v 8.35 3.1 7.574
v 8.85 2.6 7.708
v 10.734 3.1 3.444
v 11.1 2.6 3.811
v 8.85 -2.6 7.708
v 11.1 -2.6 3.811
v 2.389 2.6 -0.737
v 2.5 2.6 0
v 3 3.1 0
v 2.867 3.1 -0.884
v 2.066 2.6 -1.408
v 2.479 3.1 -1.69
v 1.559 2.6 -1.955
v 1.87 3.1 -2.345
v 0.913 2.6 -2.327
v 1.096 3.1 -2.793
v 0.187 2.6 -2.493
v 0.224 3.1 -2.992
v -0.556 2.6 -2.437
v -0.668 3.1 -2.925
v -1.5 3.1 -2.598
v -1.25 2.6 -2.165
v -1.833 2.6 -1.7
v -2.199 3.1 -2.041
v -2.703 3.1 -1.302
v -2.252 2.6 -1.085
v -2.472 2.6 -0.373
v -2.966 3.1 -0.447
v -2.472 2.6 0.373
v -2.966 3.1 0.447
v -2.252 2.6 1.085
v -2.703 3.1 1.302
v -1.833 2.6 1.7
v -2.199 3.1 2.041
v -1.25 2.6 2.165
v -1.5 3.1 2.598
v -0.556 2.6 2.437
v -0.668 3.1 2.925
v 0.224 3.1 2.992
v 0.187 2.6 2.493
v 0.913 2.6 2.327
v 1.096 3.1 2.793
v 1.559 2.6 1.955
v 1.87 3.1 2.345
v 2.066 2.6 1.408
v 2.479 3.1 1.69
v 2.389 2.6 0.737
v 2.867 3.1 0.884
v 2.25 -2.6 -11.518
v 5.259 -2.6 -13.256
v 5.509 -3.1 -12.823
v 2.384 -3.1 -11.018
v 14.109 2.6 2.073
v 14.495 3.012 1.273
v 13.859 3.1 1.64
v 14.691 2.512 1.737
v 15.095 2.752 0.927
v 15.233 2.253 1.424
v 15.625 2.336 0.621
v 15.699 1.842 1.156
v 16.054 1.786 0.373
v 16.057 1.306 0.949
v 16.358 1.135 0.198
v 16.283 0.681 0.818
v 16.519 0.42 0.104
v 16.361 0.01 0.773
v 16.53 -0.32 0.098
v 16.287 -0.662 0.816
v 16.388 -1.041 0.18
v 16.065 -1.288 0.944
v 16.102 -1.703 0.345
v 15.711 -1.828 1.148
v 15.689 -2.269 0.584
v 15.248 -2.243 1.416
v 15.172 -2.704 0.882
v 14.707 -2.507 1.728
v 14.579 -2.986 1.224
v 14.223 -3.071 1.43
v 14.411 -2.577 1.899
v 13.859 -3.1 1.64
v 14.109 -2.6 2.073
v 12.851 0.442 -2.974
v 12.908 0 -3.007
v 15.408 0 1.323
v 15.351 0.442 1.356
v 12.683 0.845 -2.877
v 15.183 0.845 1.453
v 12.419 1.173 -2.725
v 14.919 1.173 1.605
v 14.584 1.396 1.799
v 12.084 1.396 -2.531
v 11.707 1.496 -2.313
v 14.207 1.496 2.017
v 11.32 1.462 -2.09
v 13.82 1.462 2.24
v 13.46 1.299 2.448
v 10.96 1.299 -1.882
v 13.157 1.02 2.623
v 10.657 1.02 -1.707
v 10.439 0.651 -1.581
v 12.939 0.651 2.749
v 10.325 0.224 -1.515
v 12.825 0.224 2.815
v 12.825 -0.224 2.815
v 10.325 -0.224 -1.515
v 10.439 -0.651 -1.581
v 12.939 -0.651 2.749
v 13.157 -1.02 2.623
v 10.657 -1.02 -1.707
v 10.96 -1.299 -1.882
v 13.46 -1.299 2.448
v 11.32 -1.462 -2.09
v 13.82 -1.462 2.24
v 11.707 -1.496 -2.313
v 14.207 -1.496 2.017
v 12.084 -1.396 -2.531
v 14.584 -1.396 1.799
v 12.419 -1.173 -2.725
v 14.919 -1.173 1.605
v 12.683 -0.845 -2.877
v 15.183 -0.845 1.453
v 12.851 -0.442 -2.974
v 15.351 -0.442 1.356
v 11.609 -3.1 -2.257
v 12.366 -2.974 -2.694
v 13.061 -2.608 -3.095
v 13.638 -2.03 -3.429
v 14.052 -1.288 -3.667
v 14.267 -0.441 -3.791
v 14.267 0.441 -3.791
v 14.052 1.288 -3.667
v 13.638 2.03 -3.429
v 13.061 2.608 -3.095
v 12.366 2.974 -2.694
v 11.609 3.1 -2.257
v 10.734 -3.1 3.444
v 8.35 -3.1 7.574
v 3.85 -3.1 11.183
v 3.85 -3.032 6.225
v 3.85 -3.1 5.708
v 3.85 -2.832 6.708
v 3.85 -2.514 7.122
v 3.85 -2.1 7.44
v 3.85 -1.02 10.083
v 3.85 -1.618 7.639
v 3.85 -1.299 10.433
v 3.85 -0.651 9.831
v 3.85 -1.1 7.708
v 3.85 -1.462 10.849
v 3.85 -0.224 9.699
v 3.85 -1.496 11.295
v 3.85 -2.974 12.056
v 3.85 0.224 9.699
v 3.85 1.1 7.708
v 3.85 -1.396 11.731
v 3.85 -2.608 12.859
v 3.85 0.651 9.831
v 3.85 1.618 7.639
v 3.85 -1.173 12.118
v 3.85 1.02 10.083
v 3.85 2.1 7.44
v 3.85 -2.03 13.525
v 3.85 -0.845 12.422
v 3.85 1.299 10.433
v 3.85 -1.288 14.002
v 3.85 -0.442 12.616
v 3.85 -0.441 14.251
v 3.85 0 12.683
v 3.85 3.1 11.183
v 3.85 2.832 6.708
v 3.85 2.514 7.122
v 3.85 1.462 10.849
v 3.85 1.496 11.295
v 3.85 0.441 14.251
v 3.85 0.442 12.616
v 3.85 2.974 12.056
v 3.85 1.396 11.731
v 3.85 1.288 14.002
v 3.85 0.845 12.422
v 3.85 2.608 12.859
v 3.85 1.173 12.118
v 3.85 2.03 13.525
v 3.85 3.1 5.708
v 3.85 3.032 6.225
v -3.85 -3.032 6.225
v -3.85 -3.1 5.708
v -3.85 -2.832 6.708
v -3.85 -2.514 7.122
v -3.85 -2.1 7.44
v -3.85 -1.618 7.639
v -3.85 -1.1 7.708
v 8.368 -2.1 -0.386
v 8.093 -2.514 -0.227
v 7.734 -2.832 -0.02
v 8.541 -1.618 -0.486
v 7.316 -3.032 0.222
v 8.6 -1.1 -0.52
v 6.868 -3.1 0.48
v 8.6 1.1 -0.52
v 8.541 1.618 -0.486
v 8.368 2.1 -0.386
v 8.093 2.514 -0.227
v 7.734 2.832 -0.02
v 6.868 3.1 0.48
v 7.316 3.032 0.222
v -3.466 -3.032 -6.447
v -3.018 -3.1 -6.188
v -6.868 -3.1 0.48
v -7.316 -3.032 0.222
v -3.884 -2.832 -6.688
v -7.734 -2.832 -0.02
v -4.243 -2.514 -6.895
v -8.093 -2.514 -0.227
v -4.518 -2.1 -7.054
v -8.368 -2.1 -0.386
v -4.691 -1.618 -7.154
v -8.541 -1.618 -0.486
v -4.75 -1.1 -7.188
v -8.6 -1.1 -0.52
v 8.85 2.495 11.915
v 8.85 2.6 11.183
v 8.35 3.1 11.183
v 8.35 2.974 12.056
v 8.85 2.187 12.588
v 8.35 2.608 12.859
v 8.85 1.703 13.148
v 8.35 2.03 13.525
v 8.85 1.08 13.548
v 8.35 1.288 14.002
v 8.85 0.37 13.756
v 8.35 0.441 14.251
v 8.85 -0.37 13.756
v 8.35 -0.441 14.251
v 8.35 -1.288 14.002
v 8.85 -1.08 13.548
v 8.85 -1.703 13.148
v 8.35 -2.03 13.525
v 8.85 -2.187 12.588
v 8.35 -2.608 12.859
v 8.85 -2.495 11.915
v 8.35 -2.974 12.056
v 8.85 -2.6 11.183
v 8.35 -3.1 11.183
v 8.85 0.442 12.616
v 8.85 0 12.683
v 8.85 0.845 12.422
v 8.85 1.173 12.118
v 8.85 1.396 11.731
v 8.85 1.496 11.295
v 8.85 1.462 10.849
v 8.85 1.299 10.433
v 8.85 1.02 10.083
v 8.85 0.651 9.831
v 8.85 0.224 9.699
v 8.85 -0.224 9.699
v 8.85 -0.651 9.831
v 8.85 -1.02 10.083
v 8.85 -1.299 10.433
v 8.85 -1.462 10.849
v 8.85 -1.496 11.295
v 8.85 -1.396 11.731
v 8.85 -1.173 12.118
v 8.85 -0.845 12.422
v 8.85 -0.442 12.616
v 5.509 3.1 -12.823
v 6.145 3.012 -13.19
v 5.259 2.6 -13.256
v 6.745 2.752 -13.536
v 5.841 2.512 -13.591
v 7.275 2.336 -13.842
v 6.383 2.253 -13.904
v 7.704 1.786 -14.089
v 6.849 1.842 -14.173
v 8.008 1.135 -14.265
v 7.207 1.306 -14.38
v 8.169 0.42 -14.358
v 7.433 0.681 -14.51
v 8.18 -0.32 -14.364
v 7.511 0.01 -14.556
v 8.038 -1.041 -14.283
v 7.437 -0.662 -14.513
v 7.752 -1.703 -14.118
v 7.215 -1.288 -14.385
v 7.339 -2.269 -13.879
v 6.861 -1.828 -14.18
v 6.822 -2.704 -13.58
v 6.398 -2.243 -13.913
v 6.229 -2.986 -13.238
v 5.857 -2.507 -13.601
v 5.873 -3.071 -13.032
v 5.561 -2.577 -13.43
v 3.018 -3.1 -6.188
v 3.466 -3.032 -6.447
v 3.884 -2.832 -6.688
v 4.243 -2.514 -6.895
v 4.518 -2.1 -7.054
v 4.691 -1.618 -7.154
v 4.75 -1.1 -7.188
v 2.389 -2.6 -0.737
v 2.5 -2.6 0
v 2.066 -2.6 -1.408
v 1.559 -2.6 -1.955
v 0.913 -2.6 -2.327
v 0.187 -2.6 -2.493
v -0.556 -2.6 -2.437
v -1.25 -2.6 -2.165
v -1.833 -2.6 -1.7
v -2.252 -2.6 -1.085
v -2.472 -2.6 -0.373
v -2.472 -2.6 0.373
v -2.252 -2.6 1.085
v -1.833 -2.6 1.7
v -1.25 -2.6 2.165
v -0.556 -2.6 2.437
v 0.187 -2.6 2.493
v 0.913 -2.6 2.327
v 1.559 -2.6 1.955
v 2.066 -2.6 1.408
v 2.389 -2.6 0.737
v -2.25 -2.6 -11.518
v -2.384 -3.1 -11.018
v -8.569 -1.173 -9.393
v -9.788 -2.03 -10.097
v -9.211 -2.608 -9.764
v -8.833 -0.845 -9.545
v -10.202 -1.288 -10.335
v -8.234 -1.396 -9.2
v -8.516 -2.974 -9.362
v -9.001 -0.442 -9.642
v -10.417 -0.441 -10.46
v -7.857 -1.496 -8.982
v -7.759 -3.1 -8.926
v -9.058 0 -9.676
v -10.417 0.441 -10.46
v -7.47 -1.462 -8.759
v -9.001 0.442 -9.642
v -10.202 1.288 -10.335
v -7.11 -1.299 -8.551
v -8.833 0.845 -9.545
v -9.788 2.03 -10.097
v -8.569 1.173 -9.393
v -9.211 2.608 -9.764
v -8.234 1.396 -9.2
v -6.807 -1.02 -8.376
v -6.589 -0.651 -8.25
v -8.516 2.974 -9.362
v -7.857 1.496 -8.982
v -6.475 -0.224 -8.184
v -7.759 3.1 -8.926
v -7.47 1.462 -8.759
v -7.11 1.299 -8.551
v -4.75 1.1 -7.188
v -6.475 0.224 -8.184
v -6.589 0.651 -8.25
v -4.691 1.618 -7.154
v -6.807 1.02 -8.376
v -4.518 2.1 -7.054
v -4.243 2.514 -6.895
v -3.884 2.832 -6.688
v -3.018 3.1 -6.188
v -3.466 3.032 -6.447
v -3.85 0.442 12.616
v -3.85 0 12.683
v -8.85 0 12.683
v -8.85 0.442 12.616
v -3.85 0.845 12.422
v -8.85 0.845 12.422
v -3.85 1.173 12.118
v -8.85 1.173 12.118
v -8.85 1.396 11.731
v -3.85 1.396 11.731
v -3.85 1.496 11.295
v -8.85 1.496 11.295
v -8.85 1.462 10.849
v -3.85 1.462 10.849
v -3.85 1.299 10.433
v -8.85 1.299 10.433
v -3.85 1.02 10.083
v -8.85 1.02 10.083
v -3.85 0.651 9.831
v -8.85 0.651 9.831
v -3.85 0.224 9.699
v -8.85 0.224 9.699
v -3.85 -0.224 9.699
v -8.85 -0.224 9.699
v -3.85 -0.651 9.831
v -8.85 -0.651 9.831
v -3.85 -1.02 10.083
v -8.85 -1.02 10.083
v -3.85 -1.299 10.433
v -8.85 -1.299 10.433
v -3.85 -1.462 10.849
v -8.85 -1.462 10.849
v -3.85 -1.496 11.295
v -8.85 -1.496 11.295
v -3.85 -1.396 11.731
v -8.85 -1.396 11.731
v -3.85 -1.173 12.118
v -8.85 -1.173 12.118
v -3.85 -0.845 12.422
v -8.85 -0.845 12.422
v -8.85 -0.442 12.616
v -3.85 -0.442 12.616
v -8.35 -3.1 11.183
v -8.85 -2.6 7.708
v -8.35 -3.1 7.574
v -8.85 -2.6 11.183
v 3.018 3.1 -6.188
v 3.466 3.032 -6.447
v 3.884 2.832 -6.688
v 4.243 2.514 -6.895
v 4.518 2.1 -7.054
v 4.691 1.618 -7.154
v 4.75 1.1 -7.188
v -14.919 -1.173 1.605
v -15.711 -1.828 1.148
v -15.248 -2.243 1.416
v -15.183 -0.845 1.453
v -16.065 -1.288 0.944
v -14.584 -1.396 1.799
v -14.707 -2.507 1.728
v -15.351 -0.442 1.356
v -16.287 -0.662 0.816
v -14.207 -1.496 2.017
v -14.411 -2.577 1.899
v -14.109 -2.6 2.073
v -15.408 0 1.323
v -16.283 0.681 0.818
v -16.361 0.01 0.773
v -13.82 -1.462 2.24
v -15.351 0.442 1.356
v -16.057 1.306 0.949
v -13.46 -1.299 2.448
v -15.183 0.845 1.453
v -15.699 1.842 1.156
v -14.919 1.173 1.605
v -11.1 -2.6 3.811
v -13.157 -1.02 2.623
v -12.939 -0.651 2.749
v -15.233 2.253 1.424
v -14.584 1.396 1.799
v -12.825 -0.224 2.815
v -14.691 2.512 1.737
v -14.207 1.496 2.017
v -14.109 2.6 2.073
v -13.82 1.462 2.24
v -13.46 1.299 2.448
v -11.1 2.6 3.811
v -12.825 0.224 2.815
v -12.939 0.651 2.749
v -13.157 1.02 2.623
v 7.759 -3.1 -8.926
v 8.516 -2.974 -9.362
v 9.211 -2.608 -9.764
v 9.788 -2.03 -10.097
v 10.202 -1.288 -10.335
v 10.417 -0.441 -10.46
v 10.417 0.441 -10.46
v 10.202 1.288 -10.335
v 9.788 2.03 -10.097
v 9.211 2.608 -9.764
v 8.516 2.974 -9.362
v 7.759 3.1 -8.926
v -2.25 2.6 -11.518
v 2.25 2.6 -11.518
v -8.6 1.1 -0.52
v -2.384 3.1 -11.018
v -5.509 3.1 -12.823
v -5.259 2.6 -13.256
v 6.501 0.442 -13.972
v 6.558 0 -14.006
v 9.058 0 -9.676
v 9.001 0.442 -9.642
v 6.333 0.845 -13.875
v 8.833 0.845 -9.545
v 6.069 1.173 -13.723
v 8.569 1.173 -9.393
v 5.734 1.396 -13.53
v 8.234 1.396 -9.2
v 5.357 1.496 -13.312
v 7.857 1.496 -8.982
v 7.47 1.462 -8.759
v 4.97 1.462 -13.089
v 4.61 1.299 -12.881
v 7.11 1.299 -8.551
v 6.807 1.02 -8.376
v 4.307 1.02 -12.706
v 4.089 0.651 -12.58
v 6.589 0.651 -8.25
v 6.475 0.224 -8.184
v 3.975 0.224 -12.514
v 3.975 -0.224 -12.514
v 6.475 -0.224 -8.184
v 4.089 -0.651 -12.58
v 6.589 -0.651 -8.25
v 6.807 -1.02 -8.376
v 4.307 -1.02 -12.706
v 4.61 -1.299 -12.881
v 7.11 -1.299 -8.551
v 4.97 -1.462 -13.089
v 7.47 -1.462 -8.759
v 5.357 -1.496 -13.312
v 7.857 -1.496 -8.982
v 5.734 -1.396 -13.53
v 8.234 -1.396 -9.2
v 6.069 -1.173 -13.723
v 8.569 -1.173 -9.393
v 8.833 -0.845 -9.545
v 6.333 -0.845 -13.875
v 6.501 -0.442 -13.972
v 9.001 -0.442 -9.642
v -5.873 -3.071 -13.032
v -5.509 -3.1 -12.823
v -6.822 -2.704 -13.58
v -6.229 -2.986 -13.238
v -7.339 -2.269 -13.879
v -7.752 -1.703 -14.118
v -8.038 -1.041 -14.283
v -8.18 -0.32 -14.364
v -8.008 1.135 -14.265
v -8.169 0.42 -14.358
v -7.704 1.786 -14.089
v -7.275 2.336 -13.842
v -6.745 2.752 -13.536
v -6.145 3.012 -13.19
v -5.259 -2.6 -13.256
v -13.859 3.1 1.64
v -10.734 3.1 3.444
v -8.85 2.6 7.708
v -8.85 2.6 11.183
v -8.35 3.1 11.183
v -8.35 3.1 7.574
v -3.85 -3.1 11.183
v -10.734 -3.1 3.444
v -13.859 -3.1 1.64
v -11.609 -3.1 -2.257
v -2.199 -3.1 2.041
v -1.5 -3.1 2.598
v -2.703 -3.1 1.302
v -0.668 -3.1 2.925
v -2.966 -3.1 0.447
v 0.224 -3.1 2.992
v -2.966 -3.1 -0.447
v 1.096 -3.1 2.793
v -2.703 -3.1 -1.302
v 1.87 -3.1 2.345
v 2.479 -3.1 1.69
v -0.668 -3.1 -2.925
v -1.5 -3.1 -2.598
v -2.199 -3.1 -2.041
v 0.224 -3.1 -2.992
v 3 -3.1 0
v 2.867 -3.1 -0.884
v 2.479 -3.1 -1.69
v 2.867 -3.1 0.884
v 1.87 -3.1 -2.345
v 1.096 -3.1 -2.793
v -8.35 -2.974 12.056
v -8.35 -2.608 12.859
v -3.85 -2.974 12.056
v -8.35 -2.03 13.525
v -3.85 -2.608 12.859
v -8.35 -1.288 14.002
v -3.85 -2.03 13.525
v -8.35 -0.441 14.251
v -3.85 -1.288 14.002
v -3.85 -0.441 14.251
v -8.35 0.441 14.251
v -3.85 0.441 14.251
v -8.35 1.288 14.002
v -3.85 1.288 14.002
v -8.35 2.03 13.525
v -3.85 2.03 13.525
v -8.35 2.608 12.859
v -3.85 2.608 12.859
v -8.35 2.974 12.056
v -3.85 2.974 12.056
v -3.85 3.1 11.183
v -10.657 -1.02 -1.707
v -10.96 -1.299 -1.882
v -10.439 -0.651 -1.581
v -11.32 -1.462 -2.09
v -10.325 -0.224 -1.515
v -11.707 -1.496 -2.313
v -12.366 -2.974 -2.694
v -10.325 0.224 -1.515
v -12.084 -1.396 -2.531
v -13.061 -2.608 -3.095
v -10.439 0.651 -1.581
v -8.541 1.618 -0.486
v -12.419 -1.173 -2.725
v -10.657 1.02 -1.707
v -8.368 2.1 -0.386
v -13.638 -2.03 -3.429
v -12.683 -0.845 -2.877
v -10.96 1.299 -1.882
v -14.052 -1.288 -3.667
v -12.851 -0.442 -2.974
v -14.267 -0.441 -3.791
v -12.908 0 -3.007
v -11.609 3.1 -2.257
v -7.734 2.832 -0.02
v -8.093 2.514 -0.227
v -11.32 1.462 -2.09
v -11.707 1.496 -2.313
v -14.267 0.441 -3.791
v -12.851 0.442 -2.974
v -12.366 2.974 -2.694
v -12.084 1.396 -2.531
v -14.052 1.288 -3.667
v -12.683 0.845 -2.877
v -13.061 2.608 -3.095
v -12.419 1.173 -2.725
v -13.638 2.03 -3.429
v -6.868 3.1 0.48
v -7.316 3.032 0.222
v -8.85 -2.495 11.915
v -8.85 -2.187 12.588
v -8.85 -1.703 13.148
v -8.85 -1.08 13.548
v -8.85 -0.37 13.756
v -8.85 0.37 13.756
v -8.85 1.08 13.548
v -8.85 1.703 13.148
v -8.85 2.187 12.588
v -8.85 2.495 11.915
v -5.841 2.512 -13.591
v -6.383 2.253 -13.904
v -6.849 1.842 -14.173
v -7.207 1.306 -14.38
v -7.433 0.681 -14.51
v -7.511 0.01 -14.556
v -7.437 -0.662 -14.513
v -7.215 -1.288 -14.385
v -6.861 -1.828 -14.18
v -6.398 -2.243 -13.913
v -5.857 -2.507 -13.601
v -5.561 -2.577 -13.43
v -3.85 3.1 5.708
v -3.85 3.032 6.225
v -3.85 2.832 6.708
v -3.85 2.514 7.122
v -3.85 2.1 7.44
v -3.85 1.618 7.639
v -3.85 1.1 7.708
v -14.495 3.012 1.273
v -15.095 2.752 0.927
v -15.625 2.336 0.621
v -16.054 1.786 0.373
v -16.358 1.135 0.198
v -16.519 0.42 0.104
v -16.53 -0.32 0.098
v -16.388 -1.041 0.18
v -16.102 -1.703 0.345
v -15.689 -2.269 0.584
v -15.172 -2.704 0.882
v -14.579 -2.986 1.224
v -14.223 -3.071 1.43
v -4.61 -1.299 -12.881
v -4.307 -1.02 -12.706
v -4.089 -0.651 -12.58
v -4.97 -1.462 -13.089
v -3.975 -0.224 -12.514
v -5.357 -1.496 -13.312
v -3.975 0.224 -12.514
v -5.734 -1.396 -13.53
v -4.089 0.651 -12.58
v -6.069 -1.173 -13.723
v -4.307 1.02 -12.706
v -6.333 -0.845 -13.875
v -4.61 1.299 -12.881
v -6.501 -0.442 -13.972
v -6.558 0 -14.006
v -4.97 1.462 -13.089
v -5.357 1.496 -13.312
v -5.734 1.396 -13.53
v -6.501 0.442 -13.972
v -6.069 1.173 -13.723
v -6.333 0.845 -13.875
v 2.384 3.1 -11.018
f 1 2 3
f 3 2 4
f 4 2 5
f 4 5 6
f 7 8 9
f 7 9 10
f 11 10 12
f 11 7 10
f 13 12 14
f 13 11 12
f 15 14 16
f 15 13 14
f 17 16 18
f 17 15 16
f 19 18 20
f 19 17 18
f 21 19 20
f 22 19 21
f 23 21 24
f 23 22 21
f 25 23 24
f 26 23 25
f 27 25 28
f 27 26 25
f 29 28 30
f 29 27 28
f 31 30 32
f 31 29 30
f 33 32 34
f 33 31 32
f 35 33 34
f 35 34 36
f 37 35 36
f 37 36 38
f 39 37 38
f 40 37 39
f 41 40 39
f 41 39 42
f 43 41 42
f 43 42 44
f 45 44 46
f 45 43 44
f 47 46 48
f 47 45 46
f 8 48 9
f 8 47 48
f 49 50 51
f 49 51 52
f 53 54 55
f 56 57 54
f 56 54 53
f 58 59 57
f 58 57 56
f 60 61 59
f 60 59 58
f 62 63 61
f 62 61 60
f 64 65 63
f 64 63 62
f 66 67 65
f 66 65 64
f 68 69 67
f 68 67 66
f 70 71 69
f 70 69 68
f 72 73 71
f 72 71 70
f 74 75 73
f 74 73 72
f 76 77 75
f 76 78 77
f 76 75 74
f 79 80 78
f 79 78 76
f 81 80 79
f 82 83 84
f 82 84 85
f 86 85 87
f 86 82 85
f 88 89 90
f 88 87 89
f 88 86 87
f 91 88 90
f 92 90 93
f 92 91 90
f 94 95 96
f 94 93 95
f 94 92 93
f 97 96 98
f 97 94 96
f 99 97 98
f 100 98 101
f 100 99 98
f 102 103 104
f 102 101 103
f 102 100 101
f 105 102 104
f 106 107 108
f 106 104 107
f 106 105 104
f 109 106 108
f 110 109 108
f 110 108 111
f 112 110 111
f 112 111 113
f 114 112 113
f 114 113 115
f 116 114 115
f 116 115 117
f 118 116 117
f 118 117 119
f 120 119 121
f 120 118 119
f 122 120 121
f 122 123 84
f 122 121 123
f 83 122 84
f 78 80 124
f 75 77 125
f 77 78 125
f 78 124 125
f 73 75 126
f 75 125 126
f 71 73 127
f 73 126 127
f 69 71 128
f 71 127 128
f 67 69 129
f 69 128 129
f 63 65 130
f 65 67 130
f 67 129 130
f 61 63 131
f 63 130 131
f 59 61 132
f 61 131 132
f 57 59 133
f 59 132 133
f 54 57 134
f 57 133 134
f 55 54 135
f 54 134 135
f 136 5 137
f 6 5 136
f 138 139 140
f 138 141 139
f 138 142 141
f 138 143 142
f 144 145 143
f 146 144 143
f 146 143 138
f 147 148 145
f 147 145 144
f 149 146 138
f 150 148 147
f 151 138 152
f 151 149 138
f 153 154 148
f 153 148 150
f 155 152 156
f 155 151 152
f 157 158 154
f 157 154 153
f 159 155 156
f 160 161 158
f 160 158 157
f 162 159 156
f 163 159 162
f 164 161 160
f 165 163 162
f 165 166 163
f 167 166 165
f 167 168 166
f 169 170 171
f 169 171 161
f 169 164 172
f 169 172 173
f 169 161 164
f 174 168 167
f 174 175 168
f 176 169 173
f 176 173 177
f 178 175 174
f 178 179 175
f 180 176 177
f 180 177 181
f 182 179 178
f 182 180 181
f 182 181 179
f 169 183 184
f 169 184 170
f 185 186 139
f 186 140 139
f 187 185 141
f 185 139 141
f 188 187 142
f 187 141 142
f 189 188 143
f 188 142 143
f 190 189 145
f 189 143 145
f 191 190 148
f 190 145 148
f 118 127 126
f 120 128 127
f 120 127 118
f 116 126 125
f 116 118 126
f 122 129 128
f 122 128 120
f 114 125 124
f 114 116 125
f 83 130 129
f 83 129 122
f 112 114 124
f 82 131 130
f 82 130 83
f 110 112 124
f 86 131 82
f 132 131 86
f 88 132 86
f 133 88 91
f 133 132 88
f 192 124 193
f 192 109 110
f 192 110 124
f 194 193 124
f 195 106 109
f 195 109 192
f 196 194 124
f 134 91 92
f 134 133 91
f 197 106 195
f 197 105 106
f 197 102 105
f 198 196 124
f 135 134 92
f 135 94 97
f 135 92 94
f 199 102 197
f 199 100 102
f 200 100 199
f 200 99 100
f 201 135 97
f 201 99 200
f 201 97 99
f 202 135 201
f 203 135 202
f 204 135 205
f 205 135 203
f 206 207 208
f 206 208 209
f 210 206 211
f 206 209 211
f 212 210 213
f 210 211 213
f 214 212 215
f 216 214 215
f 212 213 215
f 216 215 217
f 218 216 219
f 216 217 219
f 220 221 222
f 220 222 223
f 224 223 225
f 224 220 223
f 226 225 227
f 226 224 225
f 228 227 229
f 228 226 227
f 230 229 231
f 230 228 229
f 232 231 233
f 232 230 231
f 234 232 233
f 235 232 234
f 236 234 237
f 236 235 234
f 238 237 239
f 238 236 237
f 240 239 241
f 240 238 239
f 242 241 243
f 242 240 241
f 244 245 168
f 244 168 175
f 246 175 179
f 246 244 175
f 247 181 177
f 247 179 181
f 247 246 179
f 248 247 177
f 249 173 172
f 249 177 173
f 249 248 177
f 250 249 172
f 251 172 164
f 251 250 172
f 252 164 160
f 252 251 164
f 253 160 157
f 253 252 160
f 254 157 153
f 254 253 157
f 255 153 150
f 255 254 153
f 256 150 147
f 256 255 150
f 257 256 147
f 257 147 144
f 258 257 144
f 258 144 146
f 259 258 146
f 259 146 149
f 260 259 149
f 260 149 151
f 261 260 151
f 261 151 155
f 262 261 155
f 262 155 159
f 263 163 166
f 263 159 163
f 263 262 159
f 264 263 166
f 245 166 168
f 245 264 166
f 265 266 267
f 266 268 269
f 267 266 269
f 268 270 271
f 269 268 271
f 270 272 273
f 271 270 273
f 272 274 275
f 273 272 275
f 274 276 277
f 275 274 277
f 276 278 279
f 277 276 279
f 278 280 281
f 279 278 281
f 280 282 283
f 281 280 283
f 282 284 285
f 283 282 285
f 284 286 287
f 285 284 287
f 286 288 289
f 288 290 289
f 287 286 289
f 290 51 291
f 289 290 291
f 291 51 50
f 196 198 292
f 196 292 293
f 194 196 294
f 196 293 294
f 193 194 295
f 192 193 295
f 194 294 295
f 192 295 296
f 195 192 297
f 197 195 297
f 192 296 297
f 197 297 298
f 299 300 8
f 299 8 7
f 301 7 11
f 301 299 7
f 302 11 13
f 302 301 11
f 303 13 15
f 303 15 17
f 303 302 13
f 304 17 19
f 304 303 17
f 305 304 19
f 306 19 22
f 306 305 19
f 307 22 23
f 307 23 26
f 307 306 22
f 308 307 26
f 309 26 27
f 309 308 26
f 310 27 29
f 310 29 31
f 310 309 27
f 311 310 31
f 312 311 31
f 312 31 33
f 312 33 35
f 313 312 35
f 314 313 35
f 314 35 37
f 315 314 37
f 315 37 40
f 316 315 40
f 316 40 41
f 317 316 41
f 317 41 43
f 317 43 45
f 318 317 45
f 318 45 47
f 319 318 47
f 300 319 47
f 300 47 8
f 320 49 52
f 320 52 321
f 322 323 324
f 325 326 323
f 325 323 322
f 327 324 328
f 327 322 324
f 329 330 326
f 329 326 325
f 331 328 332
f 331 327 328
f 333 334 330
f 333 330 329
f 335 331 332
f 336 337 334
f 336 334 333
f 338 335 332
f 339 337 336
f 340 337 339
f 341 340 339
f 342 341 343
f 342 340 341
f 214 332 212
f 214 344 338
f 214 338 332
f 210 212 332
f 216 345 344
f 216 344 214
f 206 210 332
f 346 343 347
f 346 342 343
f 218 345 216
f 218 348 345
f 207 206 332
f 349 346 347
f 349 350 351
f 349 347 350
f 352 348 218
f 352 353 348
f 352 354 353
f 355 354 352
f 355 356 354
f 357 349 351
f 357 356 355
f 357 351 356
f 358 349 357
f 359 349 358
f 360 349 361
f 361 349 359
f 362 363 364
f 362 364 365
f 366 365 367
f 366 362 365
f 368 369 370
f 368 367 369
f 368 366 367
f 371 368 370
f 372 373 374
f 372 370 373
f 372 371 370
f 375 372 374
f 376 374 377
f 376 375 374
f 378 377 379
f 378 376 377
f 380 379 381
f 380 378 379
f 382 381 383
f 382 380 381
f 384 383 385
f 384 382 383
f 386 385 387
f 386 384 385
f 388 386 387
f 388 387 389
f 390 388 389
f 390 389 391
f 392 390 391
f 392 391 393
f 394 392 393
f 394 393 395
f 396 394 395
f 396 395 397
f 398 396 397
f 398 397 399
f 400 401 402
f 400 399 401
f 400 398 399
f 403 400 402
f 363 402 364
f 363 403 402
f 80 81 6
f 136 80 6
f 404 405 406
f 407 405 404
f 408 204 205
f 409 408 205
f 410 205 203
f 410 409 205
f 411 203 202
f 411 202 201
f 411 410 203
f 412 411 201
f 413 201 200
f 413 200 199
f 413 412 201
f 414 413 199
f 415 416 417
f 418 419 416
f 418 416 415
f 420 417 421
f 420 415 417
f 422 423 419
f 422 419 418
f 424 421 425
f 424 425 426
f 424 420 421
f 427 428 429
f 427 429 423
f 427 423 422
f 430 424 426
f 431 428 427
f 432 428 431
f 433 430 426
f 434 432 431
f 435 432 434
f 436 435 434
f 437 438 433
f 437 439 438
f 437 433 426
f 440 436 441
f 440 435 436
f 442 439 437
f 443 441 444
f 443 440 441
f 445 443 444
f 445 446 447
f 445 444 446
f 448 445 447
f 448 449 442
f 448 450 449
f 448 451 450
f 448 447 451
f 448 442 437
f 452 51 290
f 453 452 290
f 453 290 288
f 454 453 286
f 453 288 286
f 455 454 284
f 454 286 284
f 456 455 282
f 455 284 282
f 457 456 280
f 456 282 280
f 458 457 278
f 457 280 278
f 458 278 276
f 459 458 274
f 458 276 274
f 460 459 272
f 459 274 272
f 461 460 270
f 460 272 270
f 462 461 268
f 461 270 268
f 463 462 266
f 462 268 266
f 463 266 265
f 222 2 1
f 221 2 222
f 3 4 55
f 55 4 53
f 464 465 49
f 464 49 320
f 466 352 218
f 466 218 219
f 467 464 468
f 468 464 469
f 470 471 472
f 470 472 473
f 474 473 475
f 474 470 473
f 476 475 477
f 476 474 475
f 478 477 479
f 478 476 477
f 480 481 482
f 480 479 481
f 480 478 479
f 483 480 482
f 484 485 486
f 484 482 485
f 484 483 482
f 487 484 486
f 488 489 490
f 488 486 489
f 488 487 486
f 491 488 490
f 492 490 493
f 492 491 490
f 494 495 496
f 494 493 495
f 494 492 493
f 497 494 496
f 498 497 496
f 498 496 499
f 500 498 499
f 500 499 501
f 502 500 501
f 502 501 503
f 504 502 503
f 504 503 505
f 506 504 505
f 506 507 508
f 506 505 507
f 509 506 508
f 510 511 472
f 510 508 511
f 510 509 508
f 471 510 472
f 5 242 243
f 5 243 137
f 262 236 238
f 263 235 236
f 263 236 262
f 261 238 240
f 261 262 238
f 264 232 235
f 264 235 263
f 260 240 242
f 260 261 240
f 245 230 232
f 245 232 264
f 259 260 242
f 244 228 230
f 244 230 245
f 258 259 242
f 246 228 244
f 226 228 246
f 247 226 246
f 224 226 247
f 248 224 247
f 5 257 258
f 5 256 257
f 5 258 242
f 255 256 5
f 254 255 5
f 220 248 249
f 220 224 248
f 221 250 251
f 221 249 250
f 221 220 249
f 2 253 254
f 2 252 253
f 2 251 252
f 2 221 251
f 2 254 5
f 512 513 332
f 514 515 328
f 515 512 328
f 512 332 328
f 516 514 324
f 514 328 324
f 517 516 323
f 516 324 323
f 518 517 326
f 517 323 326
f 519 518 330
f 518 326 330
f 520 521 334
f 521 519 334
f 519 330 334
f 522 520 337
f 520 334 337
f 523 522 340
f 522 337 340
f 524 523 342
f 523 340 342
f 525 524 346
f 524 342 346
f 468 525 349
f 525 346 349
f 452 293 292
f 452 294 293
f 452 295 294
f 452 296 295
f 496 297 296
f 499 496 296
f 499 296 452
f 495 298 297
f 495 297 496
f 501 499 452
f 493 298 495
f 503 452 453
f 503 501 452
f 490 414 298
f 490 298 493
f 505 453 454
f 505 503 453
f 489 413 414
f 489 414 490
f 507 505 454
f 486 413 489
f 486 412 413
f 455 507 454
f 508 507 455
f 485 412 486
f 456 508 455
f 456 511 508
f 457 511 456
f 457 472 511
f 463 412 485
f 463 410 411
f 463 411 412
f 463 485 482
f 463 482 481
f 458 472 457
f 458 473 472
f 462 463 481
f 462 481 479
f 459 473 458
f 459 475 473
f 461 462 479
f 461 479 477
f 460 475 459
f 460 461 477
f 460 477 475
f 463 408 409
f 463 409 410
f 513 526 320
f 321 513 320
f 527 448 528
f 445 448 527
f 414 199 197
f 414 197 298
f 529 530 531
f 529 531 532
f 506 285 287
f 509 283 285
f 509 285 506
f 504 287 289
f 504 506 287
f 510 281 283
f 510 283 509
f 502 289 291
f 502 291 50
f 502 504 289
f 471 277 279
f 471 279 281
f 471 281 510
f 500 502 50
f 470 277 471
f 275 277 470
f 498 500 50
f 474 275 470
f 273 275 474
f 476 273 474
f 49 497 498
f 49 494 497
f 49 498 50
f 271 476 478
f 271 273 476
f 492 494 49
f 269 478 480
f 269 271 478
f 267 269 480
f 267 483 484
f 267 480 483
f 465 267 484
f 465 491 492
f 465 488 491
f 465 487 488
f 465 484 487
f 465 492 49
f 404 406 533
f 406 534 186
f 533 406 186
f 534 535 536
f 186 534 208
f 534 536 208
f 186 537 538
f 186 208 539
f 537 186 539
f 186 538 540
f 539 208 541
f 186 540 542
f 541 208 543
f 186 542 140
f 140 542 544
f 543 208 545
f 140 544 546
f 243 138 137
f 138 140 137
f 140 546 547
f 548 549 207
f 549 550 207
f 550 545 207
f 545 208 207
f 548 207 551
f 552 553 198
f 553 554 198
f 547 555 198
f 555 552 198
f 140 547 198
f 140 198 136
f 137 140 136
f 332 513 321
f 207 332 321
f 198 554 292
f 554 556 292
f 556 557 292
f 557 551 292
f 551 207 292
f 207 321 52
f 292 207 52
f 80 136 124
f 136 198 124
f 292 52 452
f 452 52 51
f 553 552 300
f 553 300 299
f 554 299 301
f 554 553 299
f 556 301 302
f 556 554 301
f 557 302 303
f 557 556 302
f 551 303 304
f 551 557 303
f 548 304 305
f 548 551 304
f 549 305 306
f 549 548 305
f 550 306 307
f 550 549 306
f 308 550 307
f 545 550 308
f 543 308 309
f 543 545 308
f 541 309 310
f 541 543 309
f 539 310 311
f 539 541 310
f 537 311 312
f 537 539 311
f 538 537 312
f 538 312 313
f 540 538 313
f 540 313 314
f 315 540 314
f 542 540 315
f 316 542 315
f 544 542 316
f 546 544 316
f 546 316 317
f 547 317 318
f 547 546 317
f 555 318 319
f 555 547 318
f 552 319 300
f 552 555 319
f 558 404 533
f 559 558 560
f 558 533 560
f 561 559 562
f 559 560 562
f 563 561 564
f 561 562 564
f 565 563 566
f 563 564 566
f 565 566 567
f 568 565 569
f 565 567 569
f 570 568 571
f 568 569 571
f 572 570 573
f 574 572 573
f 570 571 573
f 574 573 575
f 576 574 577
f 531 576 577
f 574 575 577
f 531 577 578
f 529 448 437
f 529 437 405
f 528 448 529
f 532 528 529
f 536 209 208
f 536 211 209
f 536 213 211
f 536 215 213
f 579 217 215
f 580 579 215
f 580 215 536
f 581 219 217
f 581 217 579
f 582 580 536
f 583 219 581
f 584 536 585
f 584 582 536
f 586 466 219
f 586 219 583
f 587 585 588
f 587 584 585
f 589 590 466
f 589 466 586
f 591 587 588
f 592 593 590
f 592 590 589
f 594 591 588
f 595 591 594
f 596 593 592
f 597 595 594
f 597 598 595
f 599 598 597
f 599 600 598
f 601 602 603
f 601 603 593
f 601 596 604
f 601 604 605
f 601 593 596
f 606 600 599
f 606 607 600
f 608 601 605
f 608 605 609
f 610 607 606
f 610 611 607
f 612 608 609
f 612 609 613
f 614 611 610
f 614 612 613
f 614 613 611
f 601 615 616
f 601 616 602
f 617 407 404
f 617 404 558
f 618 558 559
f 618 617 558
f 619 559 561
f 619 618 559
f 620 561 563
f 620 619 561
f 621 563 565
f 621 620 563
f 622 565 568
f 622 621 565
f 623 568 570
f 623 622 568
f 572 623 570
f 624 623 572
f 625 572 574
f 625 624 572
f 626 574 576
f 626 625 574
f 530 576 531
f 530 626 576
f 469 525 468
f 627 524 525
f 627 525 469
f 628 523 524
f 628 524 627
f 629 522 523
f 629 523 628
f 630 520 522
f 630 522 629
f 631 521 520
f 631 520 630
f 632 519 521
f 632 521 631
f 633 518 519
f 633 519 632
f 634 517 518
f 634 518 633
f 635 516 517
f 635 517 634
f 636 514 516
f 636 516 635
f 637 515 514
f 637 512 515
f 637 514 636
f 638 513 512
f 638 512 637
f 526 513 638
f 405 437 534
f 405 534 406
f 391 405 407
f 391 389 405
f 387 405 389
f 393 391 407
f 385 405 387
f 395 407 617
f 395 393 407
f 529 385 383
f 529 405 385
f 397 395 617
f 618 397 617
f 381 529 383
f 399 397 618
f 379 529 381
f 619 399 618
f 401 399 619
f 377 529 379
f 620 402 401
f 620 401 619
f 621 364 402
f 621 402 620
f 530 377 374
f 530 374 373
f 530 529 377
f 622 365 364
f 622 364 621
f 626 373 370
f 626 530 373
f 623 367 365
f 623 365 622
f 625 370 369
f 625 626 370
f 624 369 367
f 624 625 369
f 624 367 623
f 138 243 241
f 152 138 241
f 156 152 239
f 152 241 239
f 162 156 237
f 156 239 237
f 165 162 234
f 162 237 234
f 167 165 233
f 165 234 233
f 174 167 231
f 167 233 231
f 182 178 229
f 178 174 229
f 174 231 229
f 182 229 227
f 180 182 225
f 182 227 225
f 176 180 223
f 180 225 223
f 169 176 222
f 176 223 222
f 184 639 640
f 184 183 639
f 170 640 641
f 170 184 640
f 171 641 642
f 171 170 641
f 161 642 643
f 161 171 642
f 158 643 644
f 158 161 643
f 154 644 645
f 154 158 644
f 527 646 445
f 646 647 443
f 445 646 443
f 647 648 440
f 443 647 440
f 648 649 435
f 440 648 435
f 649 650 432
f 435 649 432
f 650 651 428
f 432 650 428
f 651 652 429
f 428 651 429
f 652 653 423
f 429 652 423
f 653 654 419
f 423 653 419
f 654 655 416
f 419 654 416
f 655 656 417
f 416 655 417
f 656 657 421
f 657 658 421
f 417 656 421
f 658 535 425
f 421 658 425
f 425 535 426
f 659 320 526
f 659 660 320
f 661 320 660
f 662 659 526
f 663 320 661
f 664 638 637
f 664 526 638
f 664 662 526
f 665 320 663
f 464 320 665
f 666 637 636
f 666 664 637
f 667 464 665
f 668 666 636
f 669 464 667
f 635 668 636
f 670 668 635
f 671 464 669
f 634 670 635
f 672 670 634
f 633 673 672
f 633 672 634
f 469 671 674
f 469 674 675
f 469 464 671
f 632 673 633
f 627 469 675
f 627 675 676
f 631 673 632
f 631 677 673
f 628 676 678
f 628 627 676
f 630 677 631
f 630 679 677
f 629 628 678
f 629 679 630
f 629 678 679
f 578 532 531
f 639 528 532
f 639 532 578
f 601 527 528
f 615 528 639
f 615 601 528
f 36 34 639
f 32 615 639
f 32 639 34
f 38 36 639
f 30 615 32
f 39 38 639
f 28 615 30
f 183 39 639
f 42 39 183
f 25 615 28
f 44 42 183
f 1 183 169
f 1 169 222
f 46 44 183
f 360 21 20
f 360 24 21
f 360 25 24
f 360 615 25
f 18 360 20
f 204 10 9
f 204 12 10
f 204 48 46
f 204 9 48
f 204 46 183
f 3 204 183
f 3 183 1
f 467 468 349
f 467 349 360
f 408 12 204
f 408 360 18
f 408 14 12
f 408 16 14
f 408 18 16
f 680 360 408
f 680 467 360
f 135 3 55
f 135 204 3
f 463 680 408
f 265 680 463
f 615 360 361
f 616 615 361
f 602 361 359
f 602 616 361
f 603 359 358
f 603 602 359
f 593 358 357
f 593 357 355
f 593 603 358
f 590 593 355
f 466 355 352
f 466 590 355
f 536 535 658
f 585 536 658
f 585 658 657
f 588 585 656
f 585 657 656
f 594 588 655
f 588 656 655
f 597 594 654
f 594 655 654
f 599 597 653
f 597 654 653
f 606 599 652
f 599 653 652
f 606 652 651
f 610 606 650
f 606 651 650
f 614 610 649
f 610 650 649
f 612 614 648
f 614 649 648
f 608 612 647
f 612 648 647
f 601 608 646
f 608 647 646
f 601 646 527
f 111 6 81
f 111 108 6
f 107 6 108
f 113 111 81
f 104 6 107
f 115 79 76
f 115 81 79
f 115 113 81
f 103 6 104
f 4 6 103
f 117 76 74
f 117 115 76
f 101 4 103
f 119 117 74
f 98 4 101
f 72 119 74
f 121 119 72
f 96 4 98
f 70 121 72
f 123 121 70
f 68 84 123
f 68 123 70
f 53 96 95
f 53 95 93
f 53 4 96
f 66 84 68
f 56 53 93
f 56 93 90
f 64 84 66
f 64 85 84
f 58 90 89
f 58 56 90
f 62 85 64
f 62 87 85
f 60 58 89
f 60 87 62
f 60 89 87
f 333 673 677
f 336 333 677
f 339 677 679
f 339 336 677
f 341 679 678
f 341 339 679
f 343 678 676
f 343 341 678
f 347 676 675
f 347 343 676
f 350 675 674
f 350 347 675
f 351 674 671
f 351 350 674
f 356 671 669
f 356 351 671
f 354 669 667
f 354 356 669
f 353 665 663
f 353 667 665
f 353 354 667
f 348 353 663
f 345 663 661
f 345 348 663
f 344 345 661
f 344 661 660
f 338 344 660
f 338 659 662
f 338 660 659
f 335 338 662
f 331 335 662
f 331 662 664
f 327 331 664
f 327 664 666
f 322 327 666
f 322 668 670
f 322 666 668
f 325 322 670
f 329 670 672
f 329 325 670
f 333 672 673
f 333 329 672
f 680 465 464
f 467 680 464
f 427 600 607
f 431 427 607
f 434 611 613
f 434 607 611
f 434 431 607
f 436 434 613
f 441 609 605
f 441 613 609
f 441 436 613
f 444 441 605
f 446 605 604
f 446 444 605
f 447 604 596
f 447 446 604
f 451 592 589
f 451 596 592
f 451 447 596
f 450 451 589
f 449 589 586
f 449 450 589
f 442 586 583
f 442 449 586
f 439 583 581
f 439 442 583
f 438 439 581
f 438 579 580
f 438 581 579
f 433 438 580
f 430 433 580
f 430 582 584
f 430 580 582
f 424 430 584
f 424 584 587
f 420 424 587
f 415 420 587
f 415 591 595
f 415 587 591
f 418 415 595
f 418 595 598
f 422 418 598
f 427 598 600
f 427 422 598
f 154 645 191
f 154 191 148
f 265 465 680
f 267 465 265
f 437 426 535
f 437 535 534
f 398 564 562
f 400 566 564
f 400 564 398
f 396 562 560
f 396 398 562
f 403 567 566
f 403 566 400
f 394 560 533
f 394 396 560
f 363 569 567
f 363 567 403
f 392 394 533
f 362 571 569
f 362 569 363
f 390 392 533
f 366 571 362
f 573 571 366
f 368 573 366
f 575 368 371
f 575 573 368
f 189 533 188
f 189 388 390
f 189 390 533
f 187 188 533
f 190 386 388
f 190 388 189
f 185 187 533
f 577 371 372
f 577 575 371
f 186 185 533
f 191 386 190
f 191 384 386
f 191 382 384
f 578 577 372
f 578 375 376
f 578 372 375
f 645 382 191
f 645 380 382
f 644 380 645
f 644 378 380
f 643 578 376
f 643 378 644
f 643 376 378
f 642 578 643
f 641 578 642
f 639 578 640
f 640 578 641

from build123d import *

# Parameters (mm, degrees)
SKETCH1_R           = 2.5
BOSS_EXTRUDE1_DEPTH = 3.1
CUT_EXTRUDE1_START  = -26.968876556
SKETCH2_R           = 1.5
CUT_EXTRUDE1_DEPTH  = 36.237753113
CIRPATTERN5_COUNT   = 3
FILLET2_R           = 2
CHAMFER1_SIZE       = 0.5


with BuildPart() as part:
    # Sketch1 → Boss-Extrude1 (new body, symmetric)
    with BuildSketch(Plane(origin=(0, 0, 0), x_dir=(1, 0, 0), z_dir=(0, 1, 0))):
        Polygon((-8.85, -7.707626094), (-8.85, -14.657626094), (-3.85, -14.657626094), (-3.85, -7.707626094), (3.85, -7.707626094), (3.85, -14.657626094), (8.85, -14.657626094), (8.85, -7.707626094), (11.1, -3.810511777), (17.118876556, -0.335511777), (14.618876556, 3.994615242), (8.6, 0.519615242), (4.75, 7.188010851), (10.768876556, 10.663010851), (8.268876556, 14.99313787), (2.25, 11.51813787), (-2.25, 11.51813787), (-8.268876556, 14.99313787), (-10.768876556, 10.663010851), (-4.75, 7.188010851), (-8.6, 0.519615242), (-14.618876556, 3.994615242), (-17.118876556, -0.335511777), (-11.1, -3.810511777), align=None)
        Circle(SKETCH1_R, mode=Mode.SUBTRACT)
    extrude(amount=BOSS_EXTRUDE1_DEPTH, both=True)

    # Sketch2 → Cut-Extrude1 (cut)
    with BuildSketch(Plane.ZY.offset(8.85).offset(CUT_EXTRUDE1_START)):
        with Locations((11.182626094, 0)):
            Circle(SKETCH2_R)
        with BuildLine():
            Line((11.182626094, 3.1), (14.657626094, 3.1))
            Line((14.657626094, 3.1), (14.657626094, -3.1))
            Line((14.657626094, -3.1), (11.182626094, -3.1))
            ThreePointArc((11.182626094, -3.1), (14.282626094, 0), (11.182626094, 3.1))
        make_face()
    cut_extrude1 = extrude(amount=CUT_EXTRUDE1_DEPTH, mode=Mode.SUBTRACT)

    # CirPattern5: Cut-Extrude1 ×3 about axis
    cirpattern5_axis = Axis((0, 3.1, 0), (0, -1, 0))
    for i in range(1, CIRPATTERN5_COUNT):
        add(cut_extrude1.rotate(cirpattern5_axis, i * 360 / CIRPATTERN5_COUNT), mode=Mode.SUBTRACT)

    # Fillet2
    fillet2_edges = [part.edges().sort_by_distance(p)[0] for p in [
        (6.675, 3.1, -3.853813047),
        (0, -3.1, 7.707626094),
        (-6.675, -3.1, -3.853813047),
        (6.675, -3.1, -3.853813047),
        (-6.675, 3.1, -3.853813047),
        (0, 3.1, 7.707626094),
    ]]
    fillet(fillet2_edges, radius=FILLET2_R)

    # Chamfer1
    chamfer1_edges = [part.edges().sort_by_distance(p)[0] for p in [
        (-12.604719139, -3.1, 2.941761777),
        (-12.604719139, 3.1, 2.941761777),
        (-16.79411703, 0, 0.523011777),
        (3.754719139, -3.1, -12.38688787),
        (3.754719139, 3.1, -12.38688787),
        (7.94411703, 0, -14.80563787),
        (16.79411703, 0, 0.523011777),
        (-7.94411703, 0, -14.80563787),
        (-8.85, -3.1, 9.445126094),
        (-9.975, -3.1, 5.759068935),
        (-3.754719139, -3.1, -12.38688787),
        (0, -3.1, -11.51813787),
        (12.604719139, -3.1, 2.941761777),
        (9.975, -3.1, 5.759068935),
        (0, 3.1, -11.51813787),
        (-3.754719139, 3.1, -12.38688787),
        (9.975, 3.1, 5.759068935),
        (-2.5, -3.1, 0),
        (-2.5, 3.1, 0),
        (-9.975, 3.1, 5.759068935),
        (8.85, -3.1, 9.445126094),
        (-8.85, 3.1, 9.445126094),
        (8.85, 3.1, 9.445126094),
        (8.85, 0, 14.282626094),
        (-8.85, 0, 14.282626094),
        (12.604719139, 3.1, 2.941761777),
    ]]
    chamfer(chamfer1_edges, length=CHAMFER1_SIZE)


solid = part.part
